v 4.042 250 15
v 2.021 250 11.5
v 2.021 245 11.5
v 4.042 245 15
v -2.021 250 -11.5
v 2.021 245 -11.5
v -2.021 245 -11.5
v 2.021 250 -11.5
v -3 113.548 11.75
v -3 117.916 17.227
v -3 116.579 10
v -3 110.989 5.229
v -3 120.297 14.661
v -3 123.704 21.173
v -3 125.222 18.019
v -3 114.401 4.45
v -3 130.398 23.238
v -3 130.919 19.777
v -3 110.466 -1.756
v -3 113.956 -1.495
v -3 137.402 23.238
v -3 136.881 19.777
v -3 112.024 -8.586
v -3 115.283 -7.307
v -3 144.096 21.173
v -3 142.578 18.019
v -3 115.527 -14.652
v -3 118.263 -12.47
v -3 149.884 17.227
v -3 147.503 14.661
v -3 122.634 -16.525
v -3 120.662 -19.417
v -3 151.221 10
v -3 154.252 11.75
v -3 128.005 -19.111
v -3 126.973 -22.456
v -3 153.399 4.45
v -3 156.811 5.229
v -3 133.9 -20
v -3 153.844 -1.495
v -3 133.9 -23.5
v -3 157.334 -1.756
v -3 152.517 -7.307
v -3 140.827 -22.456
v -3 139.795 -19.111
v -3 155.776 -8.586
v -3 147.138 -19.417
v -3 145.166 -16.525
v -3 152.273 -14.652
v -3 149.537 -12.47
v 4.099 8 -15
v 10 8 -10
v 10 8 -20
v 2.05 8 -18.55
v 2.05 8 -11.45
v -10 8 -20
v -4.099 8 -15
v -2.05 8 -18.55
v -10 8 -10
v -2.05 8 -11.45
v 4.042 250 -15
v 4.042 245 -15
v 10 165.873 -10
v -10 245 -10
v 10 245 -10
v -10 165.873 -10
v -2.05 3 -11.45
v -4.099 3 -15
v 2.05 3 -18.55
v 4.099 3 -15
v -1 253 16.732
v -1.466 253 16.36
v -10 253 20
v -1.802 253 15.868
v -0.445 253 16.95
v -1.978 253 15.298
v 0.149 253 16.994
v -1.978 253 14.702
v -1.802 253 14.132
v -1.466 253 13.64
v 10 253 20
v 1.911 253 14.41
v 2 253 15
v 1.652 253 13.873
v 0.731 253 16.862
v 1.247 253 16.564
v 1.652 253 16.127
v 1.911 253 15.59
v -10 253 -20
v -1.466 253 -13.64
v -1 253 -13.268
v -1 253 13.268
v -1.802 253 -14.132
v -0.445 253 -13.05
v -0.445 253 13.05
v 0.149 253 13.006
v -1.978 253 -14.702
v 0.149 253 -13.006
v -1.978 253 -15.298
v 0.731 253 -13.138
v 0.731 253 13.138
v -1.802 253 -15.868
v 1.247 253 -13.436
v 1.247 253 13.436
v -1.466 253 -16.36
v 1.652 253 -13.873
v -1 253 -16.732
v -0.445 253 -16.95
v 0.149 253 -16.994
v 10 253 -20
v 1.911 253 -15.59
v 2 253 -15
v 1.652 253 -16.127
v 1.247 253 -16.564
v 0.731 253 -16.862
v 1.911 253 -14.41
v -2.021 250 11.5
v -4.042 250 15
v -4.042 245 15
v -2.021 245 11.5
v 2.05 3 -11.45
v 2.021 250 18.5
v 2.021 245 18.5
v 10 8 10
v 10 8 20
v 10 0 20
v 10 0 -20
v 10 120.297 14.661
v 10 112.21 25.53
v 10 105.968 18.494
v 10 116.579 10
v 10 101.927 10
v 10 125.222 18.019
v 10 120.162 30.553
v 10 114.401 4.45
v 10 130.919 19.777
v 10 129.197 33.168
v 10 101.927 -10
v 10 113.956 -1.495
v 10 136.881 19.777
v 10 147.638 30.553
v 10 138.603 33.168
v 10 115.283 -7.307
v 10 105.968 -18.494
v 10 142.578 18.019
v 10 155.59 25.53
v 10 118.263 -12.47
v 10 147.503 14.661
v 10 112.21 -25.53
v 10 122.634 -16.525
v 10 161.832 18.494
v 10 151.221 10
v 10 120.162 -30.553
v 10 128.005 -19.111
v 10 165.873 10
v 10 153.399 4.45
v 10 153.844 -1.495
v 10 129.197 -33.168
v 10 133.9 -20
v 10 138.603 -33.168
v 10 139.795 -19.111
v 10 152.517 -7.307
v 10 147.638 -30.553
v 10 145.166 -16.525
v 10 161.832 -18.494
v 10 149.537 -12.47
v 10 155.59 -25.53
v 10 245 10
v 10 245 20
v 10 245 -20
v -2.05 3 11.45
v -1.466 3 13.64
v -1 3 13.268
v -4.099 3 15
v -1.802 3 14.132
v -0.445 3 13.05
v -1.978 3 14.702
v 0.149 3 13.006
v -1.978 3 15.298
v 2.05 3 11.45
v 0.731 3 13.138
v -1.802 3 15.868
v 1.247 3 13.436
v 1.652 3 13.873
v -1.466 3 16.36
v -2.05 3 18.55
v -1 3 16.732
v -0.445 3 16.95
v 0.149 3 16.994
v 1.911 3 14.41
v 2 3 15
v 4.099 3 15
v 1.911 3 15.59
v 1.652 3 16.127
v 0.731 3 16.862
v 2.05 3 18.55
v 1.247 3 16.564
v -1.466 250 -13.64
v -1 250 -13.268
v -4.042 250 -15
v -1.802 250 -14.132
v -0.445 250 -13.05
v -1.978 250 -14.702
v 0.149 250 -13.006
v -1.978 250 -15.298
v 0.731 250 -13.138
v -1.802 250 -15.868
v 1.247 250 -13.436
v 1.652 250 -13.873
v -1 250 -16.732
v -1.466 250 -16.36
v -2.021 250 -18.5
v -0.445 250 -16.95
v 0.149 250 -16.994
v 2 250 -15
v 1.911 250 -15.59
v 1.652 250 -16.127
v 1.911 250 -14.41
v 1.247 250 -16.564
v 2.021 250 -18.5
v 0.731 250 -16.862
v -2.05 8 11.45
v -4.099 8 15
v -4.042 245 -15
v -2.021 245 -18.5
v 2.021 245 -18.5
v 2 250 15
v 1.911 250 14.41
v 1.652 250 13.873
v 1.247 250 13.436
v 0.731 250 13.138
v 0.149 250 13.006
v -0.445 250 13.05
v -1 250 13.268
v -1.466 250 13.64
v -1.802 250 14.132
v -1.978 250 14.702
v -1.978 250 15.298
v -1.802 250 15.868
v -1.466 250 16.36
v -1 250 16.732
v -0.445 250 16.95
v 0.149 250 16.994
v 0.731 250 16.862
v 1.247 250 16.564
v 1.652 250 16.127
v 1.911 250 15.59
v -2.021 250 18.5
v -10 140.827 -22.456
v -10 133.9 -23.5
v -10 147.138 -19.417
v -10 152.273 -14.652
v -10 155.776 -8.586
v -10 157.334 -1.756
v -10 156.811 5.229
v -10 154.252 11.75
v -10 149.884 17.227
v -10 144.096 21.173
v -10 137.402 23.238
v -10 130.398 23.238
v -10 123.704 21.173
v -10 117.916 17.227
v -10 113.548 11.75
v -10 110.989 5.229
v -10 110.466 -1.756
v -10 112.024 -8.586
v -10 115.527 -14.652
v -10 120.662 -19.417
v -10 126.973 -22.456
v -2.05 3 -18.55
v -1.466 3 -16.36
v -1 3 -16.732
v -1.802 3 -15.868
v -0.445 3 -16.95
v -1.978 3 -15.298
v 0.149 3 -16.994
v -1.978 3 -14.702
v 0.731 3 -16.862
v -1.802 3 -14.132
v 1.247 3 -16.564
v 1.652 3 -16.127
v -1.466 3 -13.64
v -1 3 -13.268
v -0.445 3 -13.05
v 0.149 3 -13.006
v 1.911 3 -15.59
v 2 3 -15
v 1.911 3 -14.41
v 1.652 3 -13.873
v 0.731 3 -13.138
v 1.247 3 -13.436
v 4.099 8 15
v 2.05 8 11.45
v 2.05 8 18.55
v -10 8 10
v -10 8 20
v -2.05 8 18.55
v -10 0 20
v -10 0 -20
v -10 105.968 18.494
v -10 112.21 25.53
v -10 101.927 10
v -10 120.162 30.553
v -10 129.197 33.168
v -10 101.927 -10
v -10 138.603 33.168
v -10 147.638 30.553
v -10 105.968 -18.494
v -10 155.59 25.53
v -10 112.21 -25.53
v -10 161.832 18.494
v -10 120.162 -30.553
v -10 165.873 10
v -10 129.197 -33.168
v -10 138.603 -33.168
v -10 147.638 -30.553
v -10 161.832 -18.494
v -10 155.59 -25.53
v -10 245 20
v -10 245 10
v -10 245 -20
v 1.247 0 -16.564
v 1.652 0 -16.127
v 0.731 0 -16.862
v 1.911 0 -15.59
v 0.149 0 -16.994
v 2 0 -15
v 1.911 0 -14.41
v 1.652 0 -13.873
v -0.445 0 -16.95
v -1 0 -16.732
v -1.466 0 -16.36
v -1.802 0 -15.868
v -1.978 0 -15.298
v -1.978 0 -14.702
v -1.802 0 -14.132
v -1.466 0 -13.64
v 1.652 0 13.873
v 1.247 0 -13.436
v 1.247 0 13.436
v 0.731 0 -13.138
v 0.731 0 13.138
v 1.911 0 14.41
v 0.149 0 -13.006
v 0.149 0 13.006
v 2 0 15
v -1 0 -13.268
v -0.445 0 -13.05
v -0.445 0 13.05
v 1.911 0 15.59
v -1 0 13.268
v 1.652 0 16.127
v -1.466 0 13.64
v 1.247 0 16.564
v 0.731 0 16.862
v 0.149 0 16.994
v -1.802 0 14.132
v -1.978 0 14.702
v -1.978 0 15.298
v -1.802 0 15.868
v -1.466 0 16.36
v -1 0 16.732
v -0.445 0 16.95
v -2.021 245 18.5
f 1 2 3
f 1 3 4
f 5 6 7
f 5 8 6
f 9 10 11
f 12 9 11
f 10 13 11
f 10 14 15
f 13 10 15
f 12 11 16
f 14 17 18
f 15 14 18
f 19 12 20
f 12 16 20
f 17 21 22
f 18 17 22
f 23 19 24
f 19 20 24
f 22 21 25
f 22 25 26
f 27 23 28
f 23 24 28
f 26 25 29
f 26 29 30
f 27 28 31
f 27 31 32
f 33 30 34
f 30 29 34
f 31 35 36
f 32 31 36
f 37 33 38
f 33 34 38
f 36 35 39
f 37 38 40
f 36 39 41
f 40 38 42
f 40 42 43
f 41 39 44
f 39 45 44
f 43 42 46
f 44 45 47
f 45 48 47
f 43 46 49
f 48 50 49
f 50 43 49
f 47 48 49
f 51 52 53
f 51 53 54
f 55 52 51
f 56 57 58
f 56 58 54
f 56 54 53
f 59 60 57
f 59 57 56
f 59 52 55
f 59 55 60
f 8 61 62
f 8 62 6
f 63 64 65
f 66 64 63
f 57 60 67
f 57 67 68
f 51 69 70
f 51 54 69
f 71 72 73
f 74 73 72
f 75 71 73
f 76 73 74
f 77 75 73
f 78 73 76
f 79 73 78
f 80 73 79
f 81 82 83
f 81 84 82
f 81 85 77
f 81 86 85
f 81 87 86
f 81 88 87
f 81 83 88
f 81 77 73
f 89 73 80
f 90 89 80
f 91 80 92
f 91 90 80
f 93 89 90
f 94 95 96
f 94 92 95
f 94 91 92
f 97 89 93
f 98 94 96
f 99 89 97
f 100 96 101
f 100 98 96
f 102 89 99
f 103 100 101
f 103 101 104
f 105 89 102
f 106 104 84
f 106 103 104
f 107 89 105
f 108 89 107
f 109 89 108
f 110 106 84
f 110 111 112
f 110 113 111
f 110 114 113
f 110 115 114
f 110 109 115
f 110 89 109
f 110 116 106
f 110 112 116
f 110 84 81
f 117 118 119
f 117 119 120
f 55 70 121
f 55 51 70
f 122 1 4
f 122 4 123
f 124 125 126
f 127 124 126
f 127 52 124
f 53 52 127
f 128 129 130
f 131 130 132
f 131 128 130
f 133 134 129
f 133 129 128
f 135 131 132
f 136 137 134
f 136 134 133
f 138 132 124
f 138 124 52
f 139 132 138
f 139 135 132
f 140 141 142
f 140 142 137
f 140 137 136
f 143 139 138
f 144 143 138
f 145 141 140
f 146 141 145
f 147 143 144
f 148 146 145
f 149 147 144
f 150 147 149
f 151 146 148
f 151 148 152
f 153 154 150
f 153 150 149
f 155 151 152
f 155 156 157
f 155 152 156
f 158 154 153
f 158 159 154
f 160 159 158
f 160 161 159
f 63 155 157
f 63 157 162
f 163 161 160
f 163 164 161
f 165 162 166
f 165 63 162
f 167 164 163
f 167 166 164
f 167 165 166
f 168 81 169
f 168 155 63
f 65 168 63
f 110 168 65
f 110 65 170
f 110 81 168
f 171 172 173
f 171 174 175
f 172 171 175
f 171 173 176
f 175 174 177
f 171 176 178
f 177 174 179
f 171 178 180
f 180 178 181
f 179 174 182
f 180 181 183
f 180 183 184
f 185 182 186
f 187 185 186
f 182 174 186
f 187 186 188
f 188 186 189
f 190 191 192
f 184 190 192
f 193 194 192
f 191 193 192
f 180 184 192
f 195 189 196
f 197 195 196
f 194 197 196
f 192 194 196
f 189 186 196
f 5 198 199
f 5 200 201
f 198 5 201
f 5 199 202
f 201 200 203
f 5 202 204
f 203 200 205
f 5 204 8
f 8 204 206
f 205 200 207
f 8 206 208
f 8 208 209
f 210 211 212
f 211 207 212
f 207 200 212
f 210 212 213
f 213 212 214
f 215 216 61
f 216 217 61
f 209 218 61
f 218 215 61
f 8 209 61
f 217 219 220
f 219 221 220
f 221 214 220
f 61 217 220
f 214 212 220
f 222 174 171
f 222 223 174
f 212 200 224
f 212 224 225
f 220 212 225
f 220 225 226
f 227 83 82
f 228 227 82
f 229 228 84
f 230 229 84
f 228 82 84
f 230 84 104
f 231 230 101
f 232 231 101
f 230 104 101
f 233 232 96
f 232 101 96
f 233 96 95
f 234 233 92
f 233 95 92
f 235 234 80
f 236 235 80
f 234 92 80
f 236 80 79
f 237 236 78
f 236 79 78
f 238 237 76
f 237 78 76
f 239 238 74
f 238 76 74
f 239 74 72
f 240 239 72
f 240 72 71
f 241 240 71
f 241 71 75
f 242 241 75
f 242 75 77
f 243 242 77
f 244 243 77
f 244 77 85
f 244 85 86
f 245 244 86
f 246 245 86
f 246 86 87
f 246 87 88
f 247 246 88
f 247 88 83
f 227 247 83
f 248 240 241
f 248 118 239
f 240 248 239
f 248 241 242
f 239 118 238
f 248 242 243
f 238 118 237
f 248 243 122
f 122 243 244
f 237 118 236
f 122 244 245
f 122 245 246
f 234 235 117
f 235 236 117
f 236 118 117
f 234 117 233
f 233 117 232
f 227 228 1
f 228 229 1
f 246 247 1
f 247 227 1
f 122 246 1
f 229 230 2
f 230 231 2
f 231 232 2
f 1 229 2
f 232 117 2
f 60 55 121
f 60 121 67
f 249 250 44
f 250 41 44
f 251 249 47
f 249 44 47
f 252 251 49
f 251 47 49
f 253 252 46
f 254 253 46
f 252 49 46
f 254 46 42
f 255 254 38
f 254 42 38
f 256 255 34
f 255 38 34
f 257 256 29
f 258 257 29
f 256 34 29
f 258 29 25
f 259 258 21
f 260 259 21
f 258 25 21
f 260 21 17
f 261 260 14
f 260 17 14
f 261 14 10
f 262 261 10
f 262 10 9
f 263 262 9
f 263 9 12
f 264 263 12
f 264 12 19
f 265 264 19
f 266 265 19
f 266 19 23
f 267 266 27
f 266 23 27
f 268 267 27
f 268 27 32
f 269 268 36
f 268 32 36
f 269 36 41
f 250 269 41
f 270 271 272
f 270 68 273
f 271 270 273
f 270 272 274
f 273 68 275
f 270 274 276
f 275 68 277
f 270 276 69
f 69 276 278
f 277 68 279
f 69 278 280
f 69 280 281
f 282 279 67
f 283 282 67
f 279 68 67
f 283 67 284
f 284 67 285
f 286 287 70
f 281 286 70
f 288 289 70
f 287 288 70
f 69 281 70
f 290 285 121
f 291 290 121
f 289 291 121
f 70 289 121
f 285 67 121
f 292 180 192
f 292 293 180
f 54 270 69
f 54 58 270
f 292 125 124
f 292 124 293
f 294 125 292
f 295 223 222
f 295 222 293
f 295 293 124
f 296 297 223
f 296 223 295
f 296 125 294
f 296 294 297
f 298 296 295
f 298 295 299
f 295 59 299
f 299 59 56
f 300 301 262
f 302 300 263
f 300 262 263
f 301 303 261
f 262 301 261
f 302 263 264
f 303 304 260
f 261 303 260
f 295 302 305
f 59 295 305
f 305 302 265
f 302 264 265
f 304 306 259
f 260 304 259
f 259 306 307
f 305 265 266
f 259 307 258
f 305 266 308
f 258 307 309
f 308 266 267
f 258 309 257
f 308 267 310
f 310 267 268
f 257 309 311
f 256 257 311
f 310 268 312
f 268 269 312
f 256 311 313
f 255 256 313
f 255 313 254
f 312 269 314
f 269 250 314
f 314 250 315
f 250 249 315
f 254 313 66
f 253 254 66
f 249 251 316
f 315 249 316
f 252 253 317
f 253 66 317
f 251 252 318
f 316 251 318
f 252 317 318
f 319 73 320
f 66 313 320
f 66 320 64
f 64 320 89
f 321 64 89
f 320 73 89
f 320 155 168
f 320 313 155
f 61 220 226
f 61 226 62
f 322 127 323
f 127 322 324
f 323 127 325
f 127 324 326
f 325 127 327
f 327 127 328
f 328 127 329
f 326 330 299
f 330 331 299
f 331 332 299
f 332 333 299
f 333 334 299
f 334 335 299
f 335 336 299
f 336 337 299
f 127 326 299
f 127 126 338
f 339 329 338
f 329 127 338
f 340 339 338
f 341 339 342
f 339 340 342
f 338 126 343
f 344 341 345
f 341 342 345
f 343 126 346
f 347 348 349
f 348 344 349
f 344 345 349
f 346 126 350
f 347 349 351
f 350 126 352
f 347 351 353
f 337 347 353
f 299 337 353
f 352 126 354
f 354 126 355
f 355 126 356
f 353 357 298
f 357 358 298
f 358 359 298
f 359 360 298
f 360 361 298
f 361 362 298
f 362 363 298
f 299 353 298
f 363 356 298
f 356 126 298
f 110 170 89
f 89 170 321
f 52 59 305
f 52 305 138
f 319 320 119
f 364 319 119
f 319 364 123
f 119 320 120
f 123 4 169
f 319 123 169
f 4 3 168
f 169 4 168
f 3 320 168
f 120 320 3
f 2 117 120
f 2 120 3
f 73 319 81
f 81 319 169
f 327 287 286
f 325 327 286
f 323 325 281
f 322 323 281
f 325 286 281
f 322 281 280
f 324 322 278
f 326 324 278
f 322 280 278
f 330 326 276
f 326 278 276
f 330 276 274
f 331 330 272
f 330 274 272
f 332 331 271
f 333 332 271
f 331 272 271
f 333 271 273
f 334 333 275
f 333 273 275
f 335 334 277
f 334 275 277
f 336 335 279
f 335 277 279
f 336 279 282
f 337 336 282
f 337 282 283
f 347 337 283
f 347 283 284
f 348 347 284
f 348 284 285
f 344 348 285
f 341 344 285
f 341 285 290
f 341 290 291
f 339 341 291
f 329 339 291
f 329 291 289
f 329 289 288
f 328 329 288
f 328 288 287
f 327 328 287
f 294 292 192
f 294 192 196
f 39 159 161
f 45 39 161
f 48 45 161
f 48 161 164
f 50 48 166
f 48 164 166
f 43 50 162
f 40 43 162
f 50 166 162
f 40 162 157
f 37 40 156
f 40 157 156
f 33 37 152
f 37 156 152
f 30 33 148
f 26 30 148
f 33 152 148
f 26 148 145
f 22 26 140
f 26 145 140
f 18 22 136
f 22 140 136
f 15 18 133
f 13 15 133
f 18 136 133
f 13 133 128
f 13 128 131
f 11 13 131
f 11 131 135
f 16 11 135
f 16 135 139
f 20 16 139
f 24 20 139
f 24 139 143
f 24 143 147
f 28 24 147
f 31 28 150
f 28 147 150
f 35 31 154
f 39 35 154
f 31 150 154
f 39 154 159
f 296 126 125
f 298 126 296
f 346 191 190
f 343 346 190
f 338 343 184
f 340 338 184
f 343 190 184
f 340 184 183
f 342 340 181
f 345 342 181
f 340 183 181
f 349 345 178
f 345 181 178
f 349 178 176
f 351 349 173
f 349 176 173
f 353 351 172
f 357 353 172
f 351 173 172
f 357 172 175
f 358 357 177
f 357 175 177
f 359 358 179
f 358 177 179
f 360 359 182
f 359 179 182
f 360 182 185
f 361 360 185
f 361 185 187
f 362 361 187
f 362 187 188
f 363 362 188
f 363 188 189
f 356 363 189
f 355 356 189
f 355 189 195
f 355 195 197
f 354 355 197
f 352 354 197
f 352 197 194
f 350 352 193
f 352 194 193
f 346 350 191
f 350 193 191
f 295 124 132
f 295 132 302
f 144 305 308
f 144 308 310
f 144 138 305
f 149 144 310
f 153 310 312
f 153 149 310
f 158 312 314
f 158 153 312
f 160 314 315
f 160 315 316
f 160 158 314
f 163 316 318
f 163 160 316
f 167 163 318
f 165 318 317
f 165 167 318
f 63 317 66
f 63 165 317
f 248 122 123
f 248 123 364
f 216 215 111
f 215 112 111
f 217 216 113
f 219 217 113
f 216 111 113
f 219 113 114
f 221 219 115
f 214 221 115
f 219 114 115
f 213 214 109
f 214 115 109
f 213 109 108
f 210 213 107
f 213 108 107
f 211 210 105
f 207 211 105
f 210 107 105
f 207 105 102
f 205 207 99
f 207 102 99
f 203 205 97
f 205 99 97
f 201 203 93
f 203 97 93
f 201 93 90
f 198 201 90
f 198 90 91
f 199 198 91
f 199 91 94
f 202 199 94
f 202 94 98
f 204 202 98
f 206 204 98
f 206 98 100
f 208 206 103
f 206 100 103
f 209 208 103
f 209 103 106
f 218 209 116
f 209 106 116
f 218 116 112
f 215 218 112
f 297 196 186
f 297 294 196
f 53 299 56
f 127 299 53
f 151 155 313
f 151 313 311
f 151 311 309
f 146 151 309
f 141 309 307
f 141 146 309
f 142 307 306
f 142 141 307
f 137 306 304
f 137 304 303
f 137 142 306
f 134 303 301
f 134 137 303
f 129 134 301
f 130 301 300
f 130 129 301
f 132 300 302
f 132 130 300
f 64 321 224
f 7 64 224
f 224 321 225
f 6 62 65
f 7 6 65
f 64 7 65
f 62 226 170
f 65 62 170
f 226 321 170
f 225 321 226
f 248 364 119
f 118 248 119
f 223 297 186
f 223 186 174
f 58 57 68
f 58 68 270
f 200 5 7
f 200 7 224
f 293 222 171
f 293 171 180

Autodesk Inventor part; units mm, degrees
ref_plane "YZ Plane" through (0, 0, 0) normal (1, 0, 0) x (0, 1, 0)
ref_plane "XZ Plane" through (0, 0, 0) normal (0, 1, 0) x (-1, 0, 0)
ref_plane "XY Plane" through (0, 0, 0) normal (0, 0, 1) x (1, 0, 0)
sketch "Sketch4" plane through (0, 0, 0) normal (0, 1, 0) x (-1, 0, 0)
  line L0 (-10, 20) -> (10, 20)
  line L1 (10, 20) -> (10, -20)
  line L2 (10, -20) -> (-10, -20)
  line L3 (-10, -20) -> (-10, 20)
  line L4 (-10, 20) -> (10, -20) construction
  line L5 (10, 20) -> (-10, -20) construction
  point P0 (0, 0)
  dimension "d8" = 20
  dimension "d9" = 40
extrude "Extrusion2" add sketch "Sketch4" along normal blind 3
sketch "Sketch5" plane through (0, 3, 0) normal (0, 1, 0) x (1, 0, 0)
  line L0 (10, -10) -> (-10, -10)
  line L1 (-10, -10) -> (-10, 10)
  line L2 (-10, 10) -> (10, 10)
  line L3 (10, 10) -> (10, -10)
  line L4 (10, -10) -> (-10, 10) construction
  line L5 (-10, -10) -> (10, 10) construction
  point P0 (0, 0)
  dimension "d12" = 20
  dimension "d13" = 20
extrude "Extrusion3" add sketch "Sketch5" along normal blind 100
sketch "Sketch7" plane through (0, 3, 0) normal (0, 1, 0) x (1, 0, 0)
  circle A0 centre (0, 15) radius 2
  circle A1 centre (0, -15) radius 2
  point P0 (0, 0)
  dimension "d20" = 4
  dimension "d21" = 4
extrude "Extrusion5" cut sketch "Sketch7" against normal blind 10
sketch "Sketch8" plane through (0, 3, 0) normal (0, 1, 0) x (1, 0, 0)
  circle A0 centre (0, 15) radius 2 projected
  circle A1 centre (0, 15) radius 3.55
  circle A2 centre (0, -15) radius 2 projected
  circle A3 centre (0, -15) radius 3.55
  line L0 (2.0496, -11.45) -> (4.0992, -15)
  line L1 (4.0992, -15) -> (2.0496, -18.55)
  line L2 (2.0496, -18.55) -> (-2.0496, -18.55)
  line L3 (-2.0496, -18.55) -> (-4.0992, -15)
  line L4 (-4.0992, -15) -> (-2.0496, -11.45)
  line L5 (-2.0496, -11.45) -> (2.0496, -11.45)
  line L6 (2.0496, 18.55) -> (4.0992, 15)
  line L7 (4.0992, 15) -> (2.0496, 11.45)
  line L8 (2.0496, 11.45) -> (-2.0496, 11.45)
  line L9 (-2.0496, 11.45) -> (-4.0992, 15)
  line L10 (-4.0992, 15) -> (-2.0496, 18.55)
  line L11 (-2.0496, 18.55) -> (2.0496, 18.55)
  point P0 (0, 0)
  point P1 (0, -11.45)
  point P2 (0, 18.55)
  dimension "d24" = 7.1
  dimension "d25" = 7.1
extrude "Extrusion6" cut sketch "Sketch8" against normal blind 3 contours A0 | A1 | A1 L6 L7 | A1 L11 L6 | L7 L8 A1 | A1 L10 L11 | L8 L9 A1 | A1 L9 L10 | A2 | A3 | A3 L0 L1 | A3 L5 L0 | L1 L2 A3 | A3 L4 L5 | L2 L3 A3 | A3 L3 L4
sketch "Sketch9" plane through (0, 0, 0) normal (0, -1, 0) x (1, 0, 0)
  line L0 (2.0496, 11.45) -> (4.0992, 15) projected
  circle A0 centre (0, 15) radius 4.0992
  circle A1 centre (0, -15) radius 4.0992
  point P0 (0, 0)
  point P1 (4.0992, -15)
sketch "Sketch11" plane through (-10, 0, -20) normal (-1, 0, 0) x (0, 0, 1)
  line L0 (10, 0) -> (30, 0)
  line L1 (30, 0) -> (30, 250)
  line L2 (30, 250) -> (10, 250)
  line L3 (10, 250) -> (10, 0)
  arc A0 (29.9121, 100) -> (10.0879, 100) centre (20, 132) ccw projected
  line L4 (10, 250) -> (30, 250)
  line L5 (30, 250) -> (30, 163.9726)
  line L6 (30, 163.9726) -> (10, 163.9726)
  line L7 (10, 163.9726) -> (10, 250)
  point P0 (20, 0)
  point P1 (10, 163.9726)
  dimension "d29" = 250
extrude "Extrusion7" add sketch "Sketch11" against normal blind 20 contours L3 L2 L1 A0
sketch "Sketch14" plane through (-10, 250, 10) normal (0, 1, 0) x (1, 0, 0)
  line L0 (0, 0) -> (0, -10) projected
  line L1 (20, -10) -> (20, 30) projected
  line L2 (0, -10) -> (20, -10)
  line L3 (20, -10) -> (20, 30)
  line L4 (20, 30) -> (0, 30)
  line L5 (0, 30) -> (0, -10)
  point P0 (10, 10)
extrude "Extrusion8" add sketch "Sketch14" along normal blind 3
sketch "Sketch15" plane through (-10, 253, 10) normal (0, 1, 0) x (1, 0, 0)
  circle A0 centre (10, 25) radius 3.5
  circle A1 centre (10, -5) radius 3.5
  line L0 (12.0207, 28.5) -> (14.0415, 25)
  line L1 (14.0415, 25) -> (12.0207, 21.5)
  line L2 (12.0207, 21.5) -> (7.9793, 21.5)
  line L3 (7.9793, 21.5) -> (5.9585, 25)
  line L4 (5.9585, 25) -> (7.9793, 28.5)
  line L5 (7.9793, 28.5) -> (12.0207, 28.5)
  line L6 (12.0207, -1.5) -> (14.0415, -5)
  line L7 (14.0415, -5) -> (12.0207, -8.5)
  line L8 (12.0207, -8.5) -> (7.9793, -8.5)
  line L9 (7.9793, -8.5) -> (5.9585, -5)
  line L10 (5.9585, -5) -> (7.9793, -1.5)
  line L11 (7.9793, -1.5) -> (12.0207, -1.5)
  point P0 (10, 10)
  point P1 (10, 28.5)
  point P2 (10, -1.5)
  dimension "d34" = 7
  dimension "d35" = 7
extrude "Extrusion9" cut sketch "Sketch15" against normal blind 3
sketch "Sketch16" plane through (-10, 253, 10) normal (0, 1, 0) x (1, 0, 0)
  line L0 (12.0207, 21.5) -> (14.0415, 25) projected
  circle A0 centre (10, 25) radius 4.0415
  line L1 (7.9793, -1.5) -> (12.0207, -1.5) projected
  circle A1 centre (10, -5) radius 4.0415
  point P0 (10, 10)
sketch "Sketch17" plane through (10, 0, 20) normal (1, 0, 0) x (0, 0, -1)
  circle A0 centre (20, 133.9) radius 23.5
  circle A1 centre (20, 133.9) radius 33.5
  point P0 (20, 0)
  dimension "d38" = 47
  dimension "d39" = 67
extrude "Extrusion10" add sketch "Sketch17" against normal blind 20
sketch "Sketch18" plane through (10, 0, 20) normal (1, 0, 0) x (0, 0, -1)
  point P0 (20, 0)
sketch "Sketch19" plane through (10, 0, 20) normal (1, 0, 0) x (0, 0, -1)
  circle A0 centre (20, 133.9) radius 23.5 projected
  circle A1 centre (20, 133.9) radius 20
  point P0 (20, 0)
  dimension "d42" = 40
extrude "Extrusion11" add sketch "Sketch19" against normal blind 13
thicken "Thicken1" operation add thickness 5 both sides no extend neighbours yes toward (0, 1, 0) faces at (8.0331, 3, 15) (8.0331, 3, -15)
sketch "Sketch20" plane through (0, 0, 0) normal (0, -1, 0) x (1, 0, 0)
  line L0 (-10, 20) -> (10, 20) projected
  line L1 (10, -20) -> (-10, -20) projected
  line L2 (-10, 20) -> (10, 20)
  line L3 (10, 20) -> (10, -20)
  line L4 (10, -20) -> (-10, -20)
  line L5 (-10, -20) -> (-10, 20)
  point P0 (0, 0)
extrude "Extrusion12" add sketch "Sketch20" against normal blind 3
sketch "Sketch21" plane through (0, 3, 0) normal (0, 1, 0) x (1, 0, 0)
  circle A0 centre (0, -15) radius 2
  circle A1 centre (0, 15) radius 2
  point P0 (0, 0)
  dimension "d49" = 4
  dimension "d50" = 4
extrude "Extrusion13" cut sketch "Sketch21" against normal blind 3
thicken "Thicken2" operation add thickness 5 both sides no extend neighbours yes toward (0, -1, 0) faces at (8.0138, 250, -15) (8.0138, 250, 15)
sketch "Sketch22" plane through (-10, 253, 10) normal (0, 1, 0) x (1, 0, 0)
  line L0 (0, -10) -> (20, -10) projected
  line L1 (20, 30) -> (0, 30) projected
  line L2 (0, -10) -> (20, -10)
  line L3 (20, -10) -> (20, 30)
  line L4 (20, 30) -> (0, 30)
  line L5 (0, 30) -> (0, -10)
  point P0 (10, 10)
extrude "Extrusion14" add sketch "Sketch22" against normal blind 3
sketch "Sketch23" plane through (-10, 253, 10) normal (0, 1, 0) x (1, 0, 0)
  circle A0 centre (10, -5) radius 2 projected
  circle A1 centre (10, -5) radius 2
  circle A2 centre (10, 25) radius 2 projected
  circle A3 centre (10, 25) radius 2
  point P0 (10, 10)
  dimension "d57" = 4
  dimension "d58" = 4
extrude "Extrusion15" cut sketch "Sketch23" against normal blind 3
properties part number "pylon"
